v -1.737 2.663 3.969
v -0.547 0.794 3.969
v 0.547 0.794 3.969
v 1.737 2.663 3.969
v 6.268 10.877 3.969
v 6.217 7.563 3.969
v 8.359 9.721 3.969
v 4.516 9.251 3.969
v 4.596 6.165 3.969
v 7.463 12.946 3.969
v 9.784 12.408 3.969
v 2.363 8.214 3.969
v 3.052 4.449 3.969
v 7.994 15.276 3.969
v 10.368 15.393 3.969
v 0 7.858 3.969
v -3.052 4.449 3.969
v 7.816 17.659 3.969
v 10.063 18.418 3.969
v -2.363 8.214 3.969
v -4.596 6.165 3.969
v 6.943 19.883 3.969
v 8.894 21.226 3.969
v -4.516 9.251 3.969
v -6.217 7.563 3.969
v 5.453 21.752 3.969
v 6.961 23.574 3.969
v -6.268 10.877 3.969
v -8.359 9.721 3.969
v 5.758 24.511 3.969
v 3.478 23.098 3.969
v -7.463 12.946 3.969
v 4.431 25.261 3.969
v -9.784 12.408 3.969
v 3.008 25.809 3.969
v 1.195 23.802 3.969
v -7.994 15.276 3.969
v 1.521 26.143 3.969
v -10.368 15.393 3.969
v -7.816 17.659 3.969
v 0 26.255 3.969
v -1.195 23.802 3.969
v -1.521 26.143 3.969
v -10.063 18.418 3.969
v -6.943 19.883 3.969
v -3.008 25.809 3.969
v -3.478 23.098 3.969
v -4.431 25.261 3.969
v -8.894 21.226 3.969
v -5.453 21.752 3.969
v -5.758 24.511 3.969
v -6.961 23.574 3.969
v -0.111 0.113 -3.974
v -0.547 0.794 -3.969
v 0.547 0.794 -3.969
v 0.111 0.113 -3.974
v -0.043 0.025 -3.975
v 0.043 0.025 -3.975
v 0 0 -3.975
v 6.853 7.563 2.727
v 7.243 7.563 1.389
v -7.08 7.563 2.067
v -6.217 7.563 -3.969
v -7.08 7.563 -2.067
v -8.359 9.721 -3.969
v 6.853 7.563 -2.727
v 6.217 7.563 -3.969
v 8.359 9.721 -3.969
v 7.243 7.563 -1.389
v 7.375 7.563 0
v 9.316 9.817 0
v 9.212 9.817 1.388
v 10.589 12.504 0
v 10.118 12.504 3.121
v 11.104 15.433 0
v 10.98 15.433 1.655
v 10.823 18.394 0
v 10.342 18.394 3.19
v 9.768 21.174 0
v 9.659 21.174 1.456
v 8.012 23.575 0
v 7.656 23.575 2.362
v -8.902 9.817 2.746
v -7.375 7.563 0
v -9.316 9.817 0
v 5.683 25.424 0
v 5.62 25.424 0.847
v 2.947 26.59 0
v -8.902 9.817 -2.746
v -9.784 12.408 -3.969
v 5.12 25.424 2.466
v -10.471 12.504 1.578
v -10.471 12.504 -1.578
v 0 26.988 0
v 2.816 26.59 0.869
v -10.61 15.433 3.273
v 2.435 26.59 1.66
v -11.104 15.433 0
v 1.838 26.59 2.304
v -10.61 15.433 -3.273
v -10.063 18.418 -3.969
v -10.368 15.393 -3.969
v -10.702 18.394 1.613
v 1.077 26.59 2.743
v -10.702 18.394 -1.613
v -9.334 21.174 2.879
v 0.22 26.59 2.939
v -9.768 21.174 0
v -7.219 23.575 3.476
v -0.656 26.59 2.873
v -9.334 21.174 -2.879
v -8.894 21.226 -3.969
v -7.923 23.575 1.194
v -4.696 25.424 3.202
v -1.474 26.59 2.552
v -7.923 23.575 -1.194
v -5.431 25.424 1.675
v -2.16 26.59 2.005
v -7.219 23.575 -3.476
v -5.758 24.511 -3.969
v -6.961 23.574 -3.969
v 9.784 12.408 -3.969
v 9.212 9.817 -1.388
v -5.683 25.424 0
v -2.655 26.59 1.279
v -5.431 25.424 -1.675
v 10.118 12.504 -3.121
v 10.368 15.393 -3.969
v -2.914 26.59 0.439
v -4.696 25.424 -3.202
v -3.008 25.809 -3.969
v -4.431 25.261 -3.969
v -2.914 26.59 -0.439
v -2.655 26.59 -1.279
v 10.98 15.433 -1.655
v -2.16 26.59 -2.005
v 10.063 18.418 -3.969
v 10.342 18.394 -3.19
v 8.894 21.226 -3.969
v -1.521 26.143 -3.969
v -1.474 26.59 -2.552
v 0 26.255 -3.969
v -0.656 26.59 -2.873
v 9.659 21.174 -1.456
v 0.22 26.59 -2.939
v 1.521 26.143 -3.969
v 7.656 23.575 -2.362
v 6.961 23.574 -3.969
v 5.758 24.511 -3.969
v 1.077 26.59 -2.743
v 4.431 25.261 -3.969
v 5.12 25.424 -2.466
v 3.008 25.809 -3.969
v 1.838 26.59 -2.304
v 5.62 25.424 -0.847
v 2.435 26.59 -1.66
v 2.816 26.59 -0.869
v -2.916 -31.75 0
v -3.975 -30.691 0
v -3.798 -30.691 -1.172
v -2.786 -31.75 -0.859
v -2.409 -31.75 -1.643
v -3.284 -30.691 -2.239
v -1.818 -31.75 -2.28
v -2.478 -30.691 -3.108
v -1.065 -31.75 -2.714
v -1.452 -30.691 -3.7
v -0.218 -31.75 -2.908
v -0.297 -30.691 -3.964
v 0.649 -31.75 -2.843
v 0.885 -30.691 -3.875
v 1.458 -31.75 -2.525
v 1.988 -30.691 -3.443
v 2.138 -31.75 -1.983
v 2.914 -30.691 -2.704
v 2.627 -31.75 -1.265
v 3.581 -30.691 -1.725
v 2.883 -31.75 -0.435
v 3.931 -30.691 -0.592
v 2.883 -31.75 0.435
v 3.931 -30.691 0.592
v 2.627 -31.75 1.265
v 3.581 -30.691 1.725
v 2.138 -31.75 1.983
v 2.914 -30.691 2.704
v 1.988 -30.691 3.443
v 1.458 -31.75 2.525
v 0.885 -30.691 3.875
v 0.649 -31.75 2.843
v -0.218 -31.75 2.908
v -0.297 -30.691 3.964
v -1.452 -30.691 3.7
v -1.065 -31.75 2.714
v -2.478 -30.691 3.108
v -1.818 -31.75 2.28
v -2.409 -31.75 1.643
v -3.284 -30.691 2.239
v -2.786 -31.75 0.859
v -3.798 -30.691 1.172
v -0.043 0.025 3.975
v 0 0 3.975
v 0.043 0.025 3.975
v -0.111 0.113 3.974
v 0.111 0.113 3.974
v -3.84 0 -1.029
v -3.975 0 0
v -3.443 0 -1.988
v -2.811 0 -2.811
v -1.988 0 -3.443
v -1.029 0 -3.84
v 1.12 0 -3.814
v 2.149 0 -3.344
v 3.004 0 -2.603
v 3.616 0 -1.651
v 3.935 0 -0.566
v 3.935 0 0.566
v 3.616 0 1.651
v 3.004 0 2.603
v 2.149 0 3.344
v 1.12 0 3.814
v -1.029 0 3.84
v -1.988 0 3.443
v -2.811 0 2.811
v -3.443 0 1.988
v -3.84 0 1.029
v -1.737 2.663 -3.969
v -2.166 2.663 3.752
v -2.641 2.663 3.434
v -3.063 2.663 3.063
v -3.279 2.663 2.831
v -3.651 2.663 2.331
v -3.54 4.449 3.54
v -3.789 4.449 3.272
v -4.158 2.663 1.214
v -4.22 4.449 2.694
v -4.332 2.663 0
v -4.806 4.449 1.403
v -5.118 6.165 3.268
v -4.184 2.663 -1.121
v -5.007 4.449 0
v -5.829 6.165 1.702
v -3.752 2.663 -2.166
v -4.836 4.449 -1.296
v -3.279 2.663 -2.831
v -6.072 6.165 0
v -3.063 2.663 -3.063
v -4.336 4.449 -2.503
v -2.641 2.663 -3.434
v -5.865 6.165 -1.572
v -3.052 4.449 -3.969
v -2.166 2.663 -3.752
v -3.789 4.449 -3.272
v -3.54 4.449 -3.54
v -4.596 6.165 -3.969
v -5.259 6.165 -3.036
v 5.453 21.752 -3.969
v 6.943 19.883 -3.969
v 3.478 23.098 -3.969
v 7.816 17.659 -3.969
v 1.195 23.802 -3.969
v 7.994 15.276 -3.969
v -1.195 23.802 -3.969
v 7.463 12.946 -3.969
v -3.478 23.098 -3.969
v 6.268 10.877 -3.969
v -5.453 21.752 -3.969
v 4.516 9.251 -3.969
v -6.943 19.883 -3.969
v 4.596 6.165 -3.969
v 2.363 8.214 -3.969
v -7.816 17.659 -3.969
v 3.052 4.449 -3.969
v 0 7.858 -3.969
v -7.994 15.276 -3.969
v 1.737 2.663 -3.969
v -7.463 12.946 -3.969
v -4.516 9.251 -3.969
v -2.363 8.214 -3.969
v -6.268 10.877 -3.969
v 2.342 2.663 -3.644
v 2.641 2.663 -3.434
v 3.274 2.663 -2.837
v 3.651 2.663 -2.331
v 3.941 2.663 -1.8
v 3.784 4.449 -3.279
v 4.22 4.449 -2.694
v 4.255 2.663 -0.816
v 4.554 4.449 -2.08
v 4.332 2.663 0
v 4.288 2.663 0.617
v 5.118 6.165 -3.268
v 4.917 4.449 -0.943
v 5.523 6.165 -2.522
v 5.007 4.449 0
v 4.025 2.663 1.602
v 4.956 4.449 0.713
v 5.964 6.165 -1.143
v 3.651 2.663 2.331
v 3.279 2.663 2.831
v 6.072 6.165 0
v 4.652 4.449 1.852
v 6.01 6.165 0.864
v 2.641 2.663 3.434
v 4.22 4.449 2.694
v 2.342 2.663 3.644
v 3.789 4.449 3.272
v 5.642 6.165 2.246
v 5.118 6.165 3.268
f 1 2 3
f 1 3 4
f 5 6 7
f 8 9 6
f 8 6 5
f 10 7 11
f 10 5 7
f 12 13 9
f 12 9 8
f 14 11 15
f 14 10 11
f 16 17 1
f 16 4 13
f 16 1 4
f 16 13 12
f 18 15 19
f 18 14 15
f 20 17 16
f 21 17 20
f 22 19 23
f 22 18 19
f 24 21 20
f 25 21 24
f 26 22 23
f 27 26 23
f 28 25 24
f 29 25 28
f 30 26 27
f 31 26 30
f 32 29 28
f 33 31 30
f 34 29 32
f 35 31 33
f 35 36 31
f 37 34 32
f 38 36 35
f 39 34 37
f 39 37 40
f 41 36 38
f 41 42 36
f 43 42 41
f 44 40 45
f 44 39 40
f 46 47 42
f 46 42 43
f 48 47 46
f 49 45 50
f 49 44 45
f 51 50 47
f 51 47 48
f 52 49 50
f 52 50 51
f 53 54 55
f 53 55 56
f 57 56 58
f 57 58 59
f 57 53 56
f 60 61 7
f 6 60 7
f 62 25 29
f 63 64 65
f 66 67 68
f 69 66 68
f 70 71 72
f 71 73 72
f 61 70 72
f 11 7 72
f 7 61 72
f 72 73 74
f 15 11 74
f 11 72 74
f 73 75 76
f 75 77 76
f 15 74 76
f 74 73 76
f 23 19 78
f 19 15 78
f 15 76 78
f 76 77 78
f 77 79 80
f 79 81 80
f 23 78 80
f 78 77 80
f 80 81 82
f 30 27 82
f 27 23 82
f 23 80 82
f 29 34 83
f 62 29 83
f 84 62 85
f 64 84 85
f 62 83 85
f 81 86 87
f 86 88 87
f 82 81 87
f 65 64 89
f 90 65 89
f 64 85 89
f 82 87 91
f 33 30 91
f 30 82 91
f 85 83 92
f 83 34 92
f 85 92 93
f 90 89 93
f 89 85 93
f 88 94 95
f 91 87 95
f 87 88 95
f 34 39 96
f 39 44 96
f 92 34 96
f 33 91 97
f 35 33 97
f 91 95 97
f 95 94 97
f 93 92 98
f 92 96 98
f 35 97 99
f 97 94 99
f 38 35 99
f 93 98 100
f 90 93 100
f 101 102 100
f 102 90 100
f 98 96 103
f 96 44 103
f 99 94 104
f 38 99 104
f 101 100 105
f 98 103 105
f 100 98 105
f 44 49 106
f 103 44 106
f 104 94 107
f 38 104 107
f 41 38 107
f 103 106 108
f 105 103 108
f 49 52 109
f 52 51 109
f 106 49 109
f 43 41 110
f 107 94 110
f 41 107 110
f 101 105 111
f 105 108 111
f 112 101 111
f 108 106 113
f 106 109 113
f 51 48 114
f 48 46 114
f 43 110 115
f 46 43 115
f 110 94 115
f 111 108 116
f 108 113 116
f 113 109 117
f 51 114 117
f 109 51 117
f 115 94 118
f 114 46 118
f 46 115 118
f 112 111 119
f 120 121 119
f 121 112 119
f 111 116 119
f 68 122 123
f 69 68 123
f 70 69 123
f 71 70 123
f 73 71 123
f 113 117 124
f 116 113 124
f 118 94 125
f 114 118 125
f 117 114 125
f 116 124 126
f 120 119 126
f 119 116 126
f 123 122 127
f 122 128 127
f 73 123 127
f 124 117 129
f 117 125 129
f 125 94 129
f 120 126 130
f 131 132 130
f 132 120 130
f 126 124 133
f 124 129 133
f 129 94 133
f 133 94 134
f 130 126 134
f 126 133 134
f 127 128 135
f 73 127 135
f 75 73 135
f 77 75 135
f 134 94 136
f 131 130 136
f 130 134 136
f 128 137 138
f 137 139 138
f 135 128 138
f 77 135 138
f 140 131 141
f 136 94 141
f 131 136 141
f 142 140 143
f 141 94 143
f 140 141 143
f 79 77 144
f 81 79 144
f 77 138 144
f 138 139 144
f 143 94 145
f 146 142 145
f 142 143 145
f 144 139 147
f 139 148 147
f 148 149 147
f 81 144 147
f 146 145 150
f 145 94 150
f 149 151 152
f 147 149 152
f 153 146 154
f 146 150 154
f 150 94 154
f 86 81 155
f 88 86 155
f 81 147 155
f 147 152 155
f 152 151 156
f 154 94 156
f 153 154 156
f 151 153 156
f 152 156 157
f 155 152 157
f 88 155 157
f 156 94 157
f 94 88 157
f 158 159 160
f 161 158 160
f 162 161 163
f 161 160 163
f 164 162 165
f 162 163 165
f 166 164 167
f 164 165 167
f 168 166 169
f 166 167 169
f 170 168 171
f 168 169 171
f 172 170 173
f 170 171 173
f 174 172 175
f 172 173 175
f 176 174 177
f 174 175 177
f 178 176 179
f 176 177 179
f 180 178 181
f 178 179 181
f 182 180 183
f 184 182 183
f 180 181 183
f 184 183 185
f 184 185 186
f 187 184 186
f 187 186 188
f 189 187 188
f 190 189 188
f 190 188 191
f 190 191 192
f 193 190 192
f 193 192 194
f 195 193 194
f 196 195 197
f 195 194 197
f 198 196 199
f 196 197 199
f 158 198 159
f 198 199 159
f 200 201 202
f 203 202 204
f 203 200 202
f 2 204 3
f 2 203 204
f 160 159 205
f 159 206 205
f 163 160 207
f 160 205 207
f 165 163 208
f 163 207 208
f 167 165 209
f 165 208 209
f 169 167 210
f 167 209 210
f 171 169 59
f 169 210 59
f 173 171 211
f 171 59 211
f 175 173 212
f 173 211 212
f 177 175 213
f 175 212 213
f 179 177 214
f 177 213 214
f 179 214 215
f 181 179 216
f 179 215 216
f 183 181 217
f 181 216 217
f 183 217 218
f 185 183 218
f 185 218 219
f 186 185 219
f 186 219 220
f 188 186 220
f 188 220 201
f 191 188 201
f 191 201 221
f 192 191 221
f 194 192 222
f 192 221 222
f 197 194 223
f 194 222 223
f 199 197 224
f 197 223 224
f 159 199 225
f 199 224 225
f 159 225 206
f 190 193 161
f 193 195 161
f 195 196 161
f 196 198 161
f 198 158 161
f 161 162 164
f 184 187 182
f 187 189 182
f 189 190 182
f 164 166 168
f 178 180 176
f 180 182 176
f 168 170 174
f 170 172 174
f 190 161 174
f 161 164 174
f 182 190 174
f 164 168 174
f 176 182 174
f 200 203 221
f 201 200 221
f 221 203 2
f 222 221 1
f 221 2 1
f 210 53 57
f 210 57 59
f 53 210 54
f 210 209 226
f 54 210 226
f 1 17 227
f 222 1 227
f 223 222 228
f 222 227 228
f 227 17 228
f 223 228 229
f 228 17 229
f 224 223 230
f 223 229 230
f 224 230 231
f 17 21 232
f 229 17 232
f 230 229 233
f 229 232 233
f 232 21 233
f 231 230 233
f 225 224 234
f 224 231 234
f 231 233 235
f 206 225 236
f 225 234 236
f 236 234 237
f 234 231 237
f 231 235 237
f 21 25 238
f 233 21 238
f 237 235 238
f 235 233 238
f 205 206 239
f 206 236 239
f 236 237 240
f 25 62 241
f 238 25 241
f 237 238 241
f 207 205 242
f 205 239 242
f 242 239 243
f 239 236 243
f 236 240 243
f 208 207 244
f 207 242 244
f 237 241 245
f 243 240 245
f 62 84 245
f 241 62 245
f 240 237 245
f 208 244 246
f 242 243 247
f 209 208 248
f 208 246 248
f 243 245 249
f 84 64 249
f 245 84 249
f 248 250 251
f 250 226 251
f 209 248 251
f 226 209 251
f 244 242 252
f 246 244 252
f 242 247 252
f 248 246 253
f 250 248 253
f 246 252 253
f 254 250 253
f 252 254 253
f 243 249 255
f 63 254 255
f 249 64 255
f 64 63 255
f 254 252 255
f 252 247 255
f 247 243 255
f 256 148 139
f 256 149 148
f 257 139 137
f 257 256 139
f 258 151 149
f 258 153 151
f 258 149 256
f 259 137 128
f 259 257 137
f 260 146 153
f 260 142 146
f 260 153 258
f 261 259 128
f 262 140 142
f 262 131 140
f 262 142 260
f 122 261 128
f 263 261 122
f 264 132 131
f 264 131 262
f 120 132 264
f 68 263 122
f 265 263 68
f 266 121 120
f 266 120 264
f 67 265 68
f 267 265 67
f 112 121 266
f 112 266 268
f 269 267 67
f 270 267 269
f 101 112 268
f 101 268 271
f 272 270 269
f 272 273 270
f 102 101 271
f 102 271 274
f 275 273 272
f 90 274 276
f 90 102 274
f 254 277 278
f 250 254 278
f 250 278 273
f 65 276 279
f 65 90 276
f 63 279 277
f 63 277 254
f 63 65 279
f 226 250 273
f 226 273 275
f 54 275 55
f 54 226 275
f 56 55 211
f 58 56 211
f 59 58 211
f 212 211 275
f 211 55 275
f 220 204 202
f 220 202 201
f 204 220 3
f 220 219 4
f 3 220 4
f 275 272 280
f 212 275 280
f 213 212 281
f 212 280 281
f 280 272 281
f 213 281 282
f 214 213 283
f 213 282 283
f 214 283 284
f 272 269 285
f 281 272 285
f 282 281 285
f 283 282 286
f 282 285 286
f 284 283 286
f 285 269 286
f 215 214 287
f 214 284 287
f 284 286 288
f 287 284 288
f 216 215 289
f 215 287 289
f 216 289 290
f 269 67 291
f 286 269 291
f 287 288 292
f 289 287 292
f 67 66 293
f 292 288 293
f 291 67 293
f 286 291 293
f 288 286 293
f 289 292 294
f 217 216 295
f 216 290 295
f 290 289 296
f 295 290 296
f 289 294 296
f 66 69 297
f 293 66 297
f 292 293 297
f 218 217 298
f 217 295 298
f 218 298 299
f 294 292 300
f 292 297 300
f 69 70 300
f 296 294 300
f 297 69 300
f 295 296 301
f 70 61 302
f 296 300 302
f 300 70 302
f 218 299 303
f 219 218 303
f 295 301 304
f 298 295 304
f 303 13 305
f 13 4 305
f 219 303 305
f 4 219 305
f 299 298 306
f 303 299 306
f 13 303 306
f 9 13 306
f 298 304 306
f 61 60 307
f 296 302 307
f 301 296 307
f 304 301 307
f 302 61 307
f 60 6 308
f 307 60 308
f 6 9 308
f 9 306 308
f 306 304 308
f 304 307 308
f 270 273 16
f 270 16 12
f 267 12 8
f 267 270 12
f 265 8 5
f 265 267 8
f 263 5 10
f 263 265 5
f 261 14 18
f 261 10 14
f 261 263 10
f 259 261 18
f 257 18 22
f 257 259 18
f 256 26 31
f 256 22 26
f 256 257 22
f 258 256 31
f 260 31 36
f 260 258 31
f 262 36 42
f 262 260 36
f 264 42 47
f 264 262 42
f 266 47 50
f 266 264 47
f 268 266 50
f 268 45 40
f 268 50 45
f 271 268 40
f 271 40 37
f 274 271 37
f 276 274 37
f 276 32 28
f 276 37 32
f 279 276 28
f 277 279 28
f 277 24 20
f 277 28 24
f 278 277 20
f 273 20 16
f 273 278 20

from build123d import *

# Parameters (mm, degrees)
SKETCH14_W              = 3.9751
SKETCH14_H              = 31.75
CUT_EXTRUDE10_START     = -10.379628209
CUT_EXTRUDE10_DEPTH     = 20.759256418
CUT_EXTRUDE9_DEPTH      = 34.872578542
CUT_EXTRUDE9_DEPTH_BACK = 34.872578542
SKETCH17_R              = 8.016875
CUT_EXTRUDE4_DEPTH      = 35.562321428
CUT_EXTRUDE4_DEPTH_BACK = 35.562321428
SKETCH10_R              = 3.96875
CUT_EXTRUDE7_START      = -5.55625
SKETCH22_W              = 22.225
SKETCH22_H              = 26.9875
CUT_EXTRUDE7_DEPTH      = 30.006071428
CUT_EXTRUDE8_START      = 5.55625
SKETCH23_W              = 22.225
SKETCH23_H              = 26.9875
CUT_EXTRUDE8_DEPTH      = 30.006071428
CHAMFER1_SIZE           = 1.05918
CHAMFER2_SIZE           = 0.396875


# Read off the part's stored shape, not the designer's step: Cut-Extrude10
with BuildPart() as part:
    # Sketch14 → Revolve4 (revolve)
    with BuildSketch(Plane.XY, mode=Mode.PRIVATE) as revolve4_sk:
        with Locations((1.98755, -15.875)):
            Rectangle(SKETCH14_W, SKETCH14_H)
    revolve(revolve4_sk.sketch.rotate(Axis((0, 0, 0), (0, -1, 0)), 180), axis=Axis((0, 0, 0), (0, -1, 0)))

    # Chamfer1
    chamfer1_edges = [part.edges().sort_by_distance(p)[0] for p in [
        (3.9751, -31.75, 0),
    ]]
    chamfer(chamfer1_edges, length=CHAMFER1_SIZE)


with BuildPart() as body_2:
    # Sketch21 → Revolve5 (revolve)
    with BuildSketch(Plane.XY):
        with BuildLine():
            Line((0, 26.9875), (0, 0))
            Line((0, 0), (3.9751, 0))
            ThreePointArc((3.9751, 0), (4.86426259, 4.14604002), (7.37536085, 7.562857762))
            ThreePointArc((7.37536085, 7.562857762), (10.388848273, 19.819551662), (0, 26.9875))
        make_face()
    revolve(axis=Axis((0, 0, 0), (0, -1, 0)))

    # Cut-Extrude10 outline → Cut-Extrude10 (cut)
    with BuildSketch(Plane(origin=(0, 0, 0), x_dir=(0, 0, -1), z_dir=(1, 0, 0)).offset(CUT_EXTRUDE10_START)):
        Polygon((-3.9911, -2), (-3.96875, 0.79375), (-3.96875, 28), (-12, 28), (-12, -2), align=None)
        Polygon((3.96875, 0.79375), (3.9911, -2), (12, -2), (12, 28), (3.96875, 28), align=None)
    extrude(amount=CUT_EXTRUDE10_DEPTH, mode=Mode.SUBTRACT)

    # Sketch17 → Cut-Extrude9 (cut, two sides: drawn at the far end of the back side and taken through both)
    with BuildSketch(Plane.XY.offset(-CUT_EXTRUDE9_DEPTH_BACK)):
        with Locations(Location((0, 15.875, 0), (0, 0, 270))):
            Circle(SKETCH17_R)
    extrude(amount=CUT_EXTRUDE9_DEPTH + CUT_EXTRUDE9_DEPTH_BACK, mode=Mode.SUBTRACT)

    # Combine2: union part
    add(part.part)


with BuildPart() as body_3:
    # Sketch7 → Revolve3 (revolve)
    with BuildSketch(Plane.XY):
        with BuildLine():
            Line((0, 23.8125), (0, 7.9375))
            ThreePointArc((0, 7.9375), (7.9375, 15.875), (0, 23.8125))
        make_face()
    revolve(axis=Axis((0, 0, 0), (0, 1, 0)))

    # Sketch10 → Cut-Extrude4 (cut, two sides: drawn at the far end of the back side and taken through both)
    with BuildSketch(Plane.XY.offset(-CUT_EXTRUDE4_DEPTH_BACK)):
        with Locations(Location((0, 15.875, 0), (0, 0, 180))):
            Circle(SKETCH10_R)
    extrude(amount=CUT_EXTRUDE4_DEPTH + CUT_EXTRUDE4_DEPTH_BACK, mode=Mode.SUBTRACT)

    # Sketch22 → Cut-Extrude7 (cut, through all)
    with BuildSketch(Plane.XY.offset(CUT_EXTRUDE7_START)):
        with Locations((0, 13.49375)):
            Rectangle(SKETCH22_W, SKETCH22_H)
    extrude(amount=-CUT_EXTRUDE7_DEPTH, mode=Mode.SUBTRACT)

    # Sketch23 → Cut-Extrude8 (cut, through all)
    with BuildSketch(Plane.XY.offset(CUT_EXTRUDE8_START)):
        with Locations((0, 13.49375)):
            Rectangle(SKETCH23_W, SKETCH23_H)
    extrude(amount=CUT_EXTRUDE8_DEPTH, mode=Mode.SUBTRACT)

    # Chamfer2
    chamfer2_edges = [body_3.edges().sort_by_distance(p)[0] for p in [
        (3.96875, 15.875, -5.55625),
        (3.96875, 15.875, 5.55625),
    ]]
    chamfer(chamfer2_edges, length=CHAMFER2_SIZE)


solid = body_2.part
